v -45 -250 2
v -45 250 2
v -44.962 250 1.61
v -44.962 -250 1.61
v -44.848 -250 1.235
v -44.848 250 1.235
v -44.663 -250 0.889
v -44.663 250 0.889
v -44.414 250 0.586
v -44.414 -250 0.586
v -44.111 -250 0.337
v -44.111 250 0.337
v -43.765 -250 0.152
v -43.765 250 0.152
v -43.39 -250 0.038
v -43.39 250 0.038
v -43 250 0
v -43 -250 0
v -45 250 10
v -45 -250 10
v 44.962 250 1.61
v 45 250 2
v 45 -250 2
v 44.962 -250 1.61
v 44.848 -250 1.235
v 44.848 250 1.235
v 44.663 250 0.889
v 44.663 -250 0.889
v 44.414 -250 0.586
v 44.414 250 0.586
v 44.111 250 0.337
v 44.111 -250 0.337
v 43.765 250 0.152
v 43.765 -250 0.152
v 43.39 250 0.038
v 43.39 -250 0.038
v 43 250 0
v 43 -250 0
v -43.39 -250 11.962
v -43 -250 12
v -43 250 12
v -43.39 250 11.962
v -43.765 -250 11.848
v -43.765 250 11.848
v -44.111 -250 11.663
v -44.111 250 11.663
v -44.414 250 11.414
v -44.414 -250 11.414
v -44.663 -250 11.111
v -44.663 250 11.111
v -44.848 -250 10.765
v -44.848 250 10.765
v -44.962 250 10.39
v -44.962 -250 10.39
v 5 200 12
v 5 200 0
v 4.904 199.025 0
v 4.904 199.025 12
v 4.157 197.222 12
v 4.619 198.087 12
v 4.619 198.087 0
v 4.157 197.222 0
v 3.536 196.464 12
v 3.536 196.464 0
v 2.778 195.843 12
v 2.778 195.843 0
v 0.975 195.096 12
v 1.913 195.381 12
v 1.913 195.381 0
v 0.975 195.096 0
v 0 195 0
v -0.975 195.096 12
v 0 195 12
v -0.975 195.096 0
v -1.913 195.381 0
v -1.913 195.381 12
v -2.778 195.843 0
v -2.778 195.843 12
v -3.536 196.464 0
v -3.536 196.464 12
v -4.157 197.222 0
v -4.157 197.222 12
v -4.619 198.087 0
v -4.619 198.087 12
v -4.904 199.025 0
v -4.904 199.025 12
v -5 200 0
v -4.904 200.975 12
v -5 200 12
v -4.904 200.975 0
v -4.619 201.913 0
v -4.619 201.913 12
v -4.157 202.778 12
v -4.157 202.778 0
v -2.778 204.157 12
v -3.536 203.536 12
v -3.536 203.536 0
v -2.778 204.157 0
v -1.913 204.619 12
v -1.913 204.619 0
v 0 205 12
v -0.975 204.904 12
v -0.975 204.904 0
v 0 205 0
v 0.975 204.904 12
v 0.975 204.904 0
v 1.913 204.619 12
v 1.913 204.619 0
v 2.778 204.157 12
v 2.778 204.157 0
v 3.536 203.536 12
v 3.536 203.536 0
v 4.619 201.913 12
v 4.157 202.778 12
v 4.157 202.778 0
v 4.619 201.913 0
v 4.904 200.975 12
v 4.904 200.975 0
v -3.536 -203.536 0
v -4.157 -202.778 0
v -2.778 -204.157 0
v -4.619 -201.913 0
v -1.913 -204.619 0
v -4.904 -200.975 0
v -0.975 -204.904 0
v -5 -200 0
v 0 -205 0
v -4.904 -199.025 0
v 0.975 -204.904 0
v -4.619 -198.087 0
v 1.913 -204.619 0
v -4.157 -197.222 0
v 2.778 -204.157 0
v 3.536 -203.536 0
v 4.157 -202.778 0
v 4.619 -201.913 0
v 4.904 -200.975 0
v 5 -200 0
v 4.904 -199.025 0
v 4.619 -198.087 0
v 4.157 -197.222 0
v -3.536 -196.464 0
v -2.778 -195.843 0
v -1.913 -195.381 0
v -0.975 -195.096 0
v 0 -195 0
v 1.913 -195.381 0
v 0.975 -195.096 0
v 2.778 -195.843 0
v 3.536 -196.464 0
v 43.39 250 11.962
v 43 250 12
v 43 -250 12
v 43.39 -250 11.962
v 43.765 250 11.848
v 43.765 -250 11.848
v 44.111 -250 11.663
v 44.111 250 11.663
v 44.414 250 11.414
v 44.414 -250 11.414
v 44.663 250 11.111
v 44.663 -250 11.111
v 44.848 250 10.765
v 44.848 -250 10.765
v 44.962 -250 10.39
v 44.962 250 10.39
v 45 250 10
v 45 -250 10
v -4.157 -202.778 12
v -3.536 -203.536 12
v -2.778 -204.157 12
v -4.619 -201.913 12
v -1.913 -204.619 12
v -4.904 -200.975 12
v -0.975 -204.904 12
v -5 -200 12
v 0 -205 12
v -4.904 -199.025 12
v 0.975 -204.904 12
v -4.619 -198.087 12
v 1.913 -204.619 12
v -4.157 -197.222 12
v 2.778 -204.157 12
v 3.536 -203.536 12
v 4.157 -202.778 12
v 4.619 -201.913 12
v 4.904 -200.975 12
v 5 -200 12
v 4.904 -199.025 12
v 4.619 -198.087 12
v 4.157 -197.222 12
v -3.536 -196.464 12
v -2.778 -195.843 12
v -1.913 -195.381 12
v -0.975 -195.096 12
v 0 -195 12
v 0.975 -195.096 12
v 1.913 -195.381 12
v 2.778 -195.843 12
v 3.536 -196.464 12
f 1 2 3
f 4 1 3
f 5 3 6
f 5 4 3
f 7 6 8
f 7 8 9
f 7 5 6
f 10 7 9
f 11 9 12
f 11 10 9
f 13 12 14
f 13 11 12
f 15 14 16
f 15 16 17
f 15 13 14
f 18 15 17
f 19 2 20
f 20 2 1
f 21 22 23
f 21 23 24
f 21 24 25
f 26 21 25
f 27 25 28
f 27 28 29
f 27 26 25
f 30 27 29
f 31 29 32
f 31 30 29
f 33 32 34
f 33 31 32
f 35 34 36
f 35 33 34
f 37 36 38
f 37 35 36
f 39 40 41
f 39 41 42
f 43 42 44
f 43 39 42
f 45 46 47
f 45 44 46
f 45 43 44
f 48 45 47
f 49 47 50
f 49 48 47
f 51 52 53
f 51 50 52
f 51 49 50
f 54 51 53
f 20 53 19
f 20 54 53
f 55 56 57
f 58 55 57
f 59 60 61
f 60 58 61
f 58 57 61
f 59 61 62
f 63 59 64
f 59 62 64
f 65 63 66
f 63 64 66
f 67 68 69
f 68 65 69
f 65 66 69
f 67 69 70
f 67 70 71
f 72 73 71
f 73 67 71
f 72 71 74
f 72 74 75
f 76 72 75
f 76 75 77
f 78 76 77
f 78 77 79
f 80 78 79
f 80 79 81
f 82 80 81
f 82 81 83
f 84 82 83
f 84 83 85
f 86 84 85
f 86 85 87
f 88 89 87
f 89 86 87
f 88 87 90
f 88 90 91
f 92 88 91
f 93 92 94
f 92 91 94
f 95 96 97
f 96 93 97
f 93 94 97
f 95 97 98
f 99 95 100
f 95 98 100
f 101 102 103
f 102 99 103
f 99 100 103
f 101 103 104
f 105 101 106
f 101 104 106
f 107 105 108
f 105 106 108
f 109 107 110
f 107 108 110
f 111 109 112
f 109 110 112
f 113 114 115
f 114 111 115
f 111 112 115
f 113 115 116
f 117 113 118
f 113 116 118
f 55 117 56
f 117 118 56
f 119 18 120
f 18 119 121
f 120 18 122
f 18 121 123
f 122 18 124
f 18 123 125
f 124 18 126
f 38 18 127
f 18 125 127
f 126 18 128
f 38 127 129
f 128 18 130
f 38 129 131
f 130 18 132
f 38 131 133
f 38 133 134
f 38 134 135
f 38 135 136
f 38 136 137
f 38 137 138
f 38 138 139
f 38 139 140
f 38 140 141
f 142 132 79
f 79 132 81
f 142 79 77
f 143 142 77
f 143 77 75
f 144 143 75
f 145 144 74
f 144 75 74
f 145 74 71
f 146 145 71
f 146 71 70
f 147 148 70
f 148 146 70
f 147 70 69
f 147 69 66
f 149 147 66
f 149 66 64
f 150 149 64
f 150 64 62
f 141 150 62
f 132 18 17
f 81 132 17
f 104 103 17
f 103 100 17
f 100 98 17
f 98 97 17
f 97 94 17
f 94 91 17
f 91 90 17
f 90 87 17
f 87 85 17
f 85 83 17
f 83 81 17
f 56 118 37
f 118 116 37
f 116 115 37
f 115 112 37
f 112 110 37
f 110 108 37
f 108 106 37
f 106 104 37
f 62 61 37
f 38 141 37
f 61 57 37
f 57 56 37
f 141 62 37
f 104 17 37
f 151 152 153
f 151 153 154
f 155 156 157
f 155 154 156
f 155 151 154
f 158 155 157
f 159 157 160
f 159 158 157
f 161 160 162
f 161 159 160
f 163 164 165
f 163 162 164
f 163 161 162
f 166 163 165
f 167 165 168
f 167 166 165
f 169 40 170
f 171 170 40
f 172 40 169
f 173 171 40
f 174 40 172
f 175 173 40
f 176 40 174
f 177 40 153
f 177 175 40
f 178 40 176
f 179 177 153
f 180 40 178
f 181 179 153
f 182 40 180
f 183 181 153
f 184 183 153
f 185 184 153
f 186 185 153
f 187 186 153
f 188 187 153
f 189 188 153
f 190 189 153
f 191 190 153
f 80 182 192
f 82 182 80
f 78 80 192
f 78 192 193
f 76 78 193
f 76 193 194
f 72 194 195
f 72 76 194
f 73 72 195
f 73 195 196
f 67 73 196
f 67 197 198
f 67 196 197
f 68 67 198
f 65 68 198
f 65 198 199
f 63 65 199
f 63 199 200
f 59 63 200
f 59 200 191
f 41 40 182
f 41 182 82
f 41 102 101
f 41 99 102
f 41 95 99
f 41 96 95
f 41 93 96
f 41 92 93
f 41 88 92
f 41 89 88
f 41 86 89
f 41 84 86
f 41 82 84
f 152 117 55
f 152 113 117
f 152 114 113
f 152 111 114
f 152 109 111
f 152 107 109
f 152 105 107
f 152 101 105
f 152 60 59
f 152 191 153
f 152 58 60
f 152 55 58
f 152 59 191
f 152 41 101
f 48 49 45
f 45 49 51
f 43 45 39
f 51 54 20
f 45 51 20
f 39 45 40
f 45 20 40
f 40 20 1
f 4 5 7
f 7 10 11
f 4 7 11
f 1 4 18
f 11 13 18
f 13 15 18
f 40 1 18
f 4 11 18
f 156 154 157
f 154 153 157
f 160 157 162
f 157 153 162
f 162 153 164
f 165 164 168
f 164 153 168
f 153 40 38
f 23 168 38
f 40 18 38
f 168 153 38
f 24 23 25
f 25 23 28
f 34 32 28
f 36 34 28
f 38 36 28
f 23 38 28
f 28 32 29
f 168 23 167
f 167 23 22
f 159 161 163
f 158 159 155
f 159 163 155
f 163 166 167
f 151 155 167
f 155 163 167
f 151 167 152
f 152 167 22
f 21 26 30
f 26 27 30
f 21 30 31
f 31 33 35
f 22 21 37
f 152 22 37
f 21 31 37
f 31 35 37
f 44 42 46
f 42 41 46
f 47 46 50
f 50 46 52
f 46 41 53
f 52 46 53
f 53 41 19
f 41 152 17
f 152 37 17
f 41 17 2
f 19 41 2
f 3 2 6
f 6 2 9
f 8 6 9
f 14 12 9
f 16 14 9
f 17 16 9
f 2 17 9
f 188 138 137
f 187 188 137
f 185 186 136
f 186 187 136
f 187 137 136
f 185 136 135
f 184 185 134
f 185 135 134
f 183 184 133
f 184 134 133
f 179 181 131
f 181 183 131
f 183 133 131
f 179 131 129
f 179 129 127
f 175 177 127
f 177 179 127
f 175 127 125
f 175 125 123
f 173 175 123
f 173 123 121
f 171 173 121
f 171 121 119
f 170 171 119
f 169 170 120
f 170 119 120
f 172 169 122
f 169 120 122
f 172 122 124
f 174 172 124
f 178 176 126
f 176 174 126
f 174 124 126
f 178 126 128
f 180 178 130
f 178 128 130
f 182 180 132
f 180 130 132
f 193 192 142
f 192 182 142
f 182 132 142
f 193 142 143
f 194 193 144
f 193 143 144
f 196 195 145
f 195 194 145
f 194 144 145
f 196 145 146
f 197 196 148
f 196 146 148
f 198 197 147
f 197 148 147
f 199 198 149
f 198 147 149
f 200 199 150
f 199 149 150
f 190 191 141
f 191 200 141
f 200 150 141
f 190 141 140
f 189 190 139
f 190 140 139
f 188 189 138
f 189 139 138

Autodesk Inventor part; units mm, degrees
ref_plane "YZ Plane" through (0, 0, 0) normal (1, 0, 0) x (0, 1, 0)
ref_plane "XZ Plane" through (0, 0, 0) normal (0, 1, 0) x (-1, 0, 0)
ref_plane "Work Plane1" through (0, 0, 0) normal (0, 0, 1) x (1, 0, 0)
sketch "Sketch1" plane through (0, 0, 0) normal (0, 0, 1) x (1, 0, 0)
  line L0 (-45, -250) -> (45, -250)
  line L1 (45, -250) -> (45, 250)
  line L2 (45, 250) -> (-45, 250)
  line L3 (-45, 250) -> (-45, -250)
  line L4 (0, -250) -> (0, 250) construction
  circle A0 centre (0, -200) radius 5
  line L5 (-45, 0) -> (126, 0) construction
  circle A1 centre (0, 200) radius 5
  dimension "d0" = 90
  dimension "d1" = 500
  dimension "d10" = 10
  dimension "d11" = 200
extrude "Extrusion1" add sketch "Sketch1" along normal blind 12
fillet "Fillet1" radius 2 4 edges at (-45, 0, 12) (-45, 0, 0) (45, 0, 12) (45, 0, 0)
properties part number "doga_short" material "Wood (Oak)"
